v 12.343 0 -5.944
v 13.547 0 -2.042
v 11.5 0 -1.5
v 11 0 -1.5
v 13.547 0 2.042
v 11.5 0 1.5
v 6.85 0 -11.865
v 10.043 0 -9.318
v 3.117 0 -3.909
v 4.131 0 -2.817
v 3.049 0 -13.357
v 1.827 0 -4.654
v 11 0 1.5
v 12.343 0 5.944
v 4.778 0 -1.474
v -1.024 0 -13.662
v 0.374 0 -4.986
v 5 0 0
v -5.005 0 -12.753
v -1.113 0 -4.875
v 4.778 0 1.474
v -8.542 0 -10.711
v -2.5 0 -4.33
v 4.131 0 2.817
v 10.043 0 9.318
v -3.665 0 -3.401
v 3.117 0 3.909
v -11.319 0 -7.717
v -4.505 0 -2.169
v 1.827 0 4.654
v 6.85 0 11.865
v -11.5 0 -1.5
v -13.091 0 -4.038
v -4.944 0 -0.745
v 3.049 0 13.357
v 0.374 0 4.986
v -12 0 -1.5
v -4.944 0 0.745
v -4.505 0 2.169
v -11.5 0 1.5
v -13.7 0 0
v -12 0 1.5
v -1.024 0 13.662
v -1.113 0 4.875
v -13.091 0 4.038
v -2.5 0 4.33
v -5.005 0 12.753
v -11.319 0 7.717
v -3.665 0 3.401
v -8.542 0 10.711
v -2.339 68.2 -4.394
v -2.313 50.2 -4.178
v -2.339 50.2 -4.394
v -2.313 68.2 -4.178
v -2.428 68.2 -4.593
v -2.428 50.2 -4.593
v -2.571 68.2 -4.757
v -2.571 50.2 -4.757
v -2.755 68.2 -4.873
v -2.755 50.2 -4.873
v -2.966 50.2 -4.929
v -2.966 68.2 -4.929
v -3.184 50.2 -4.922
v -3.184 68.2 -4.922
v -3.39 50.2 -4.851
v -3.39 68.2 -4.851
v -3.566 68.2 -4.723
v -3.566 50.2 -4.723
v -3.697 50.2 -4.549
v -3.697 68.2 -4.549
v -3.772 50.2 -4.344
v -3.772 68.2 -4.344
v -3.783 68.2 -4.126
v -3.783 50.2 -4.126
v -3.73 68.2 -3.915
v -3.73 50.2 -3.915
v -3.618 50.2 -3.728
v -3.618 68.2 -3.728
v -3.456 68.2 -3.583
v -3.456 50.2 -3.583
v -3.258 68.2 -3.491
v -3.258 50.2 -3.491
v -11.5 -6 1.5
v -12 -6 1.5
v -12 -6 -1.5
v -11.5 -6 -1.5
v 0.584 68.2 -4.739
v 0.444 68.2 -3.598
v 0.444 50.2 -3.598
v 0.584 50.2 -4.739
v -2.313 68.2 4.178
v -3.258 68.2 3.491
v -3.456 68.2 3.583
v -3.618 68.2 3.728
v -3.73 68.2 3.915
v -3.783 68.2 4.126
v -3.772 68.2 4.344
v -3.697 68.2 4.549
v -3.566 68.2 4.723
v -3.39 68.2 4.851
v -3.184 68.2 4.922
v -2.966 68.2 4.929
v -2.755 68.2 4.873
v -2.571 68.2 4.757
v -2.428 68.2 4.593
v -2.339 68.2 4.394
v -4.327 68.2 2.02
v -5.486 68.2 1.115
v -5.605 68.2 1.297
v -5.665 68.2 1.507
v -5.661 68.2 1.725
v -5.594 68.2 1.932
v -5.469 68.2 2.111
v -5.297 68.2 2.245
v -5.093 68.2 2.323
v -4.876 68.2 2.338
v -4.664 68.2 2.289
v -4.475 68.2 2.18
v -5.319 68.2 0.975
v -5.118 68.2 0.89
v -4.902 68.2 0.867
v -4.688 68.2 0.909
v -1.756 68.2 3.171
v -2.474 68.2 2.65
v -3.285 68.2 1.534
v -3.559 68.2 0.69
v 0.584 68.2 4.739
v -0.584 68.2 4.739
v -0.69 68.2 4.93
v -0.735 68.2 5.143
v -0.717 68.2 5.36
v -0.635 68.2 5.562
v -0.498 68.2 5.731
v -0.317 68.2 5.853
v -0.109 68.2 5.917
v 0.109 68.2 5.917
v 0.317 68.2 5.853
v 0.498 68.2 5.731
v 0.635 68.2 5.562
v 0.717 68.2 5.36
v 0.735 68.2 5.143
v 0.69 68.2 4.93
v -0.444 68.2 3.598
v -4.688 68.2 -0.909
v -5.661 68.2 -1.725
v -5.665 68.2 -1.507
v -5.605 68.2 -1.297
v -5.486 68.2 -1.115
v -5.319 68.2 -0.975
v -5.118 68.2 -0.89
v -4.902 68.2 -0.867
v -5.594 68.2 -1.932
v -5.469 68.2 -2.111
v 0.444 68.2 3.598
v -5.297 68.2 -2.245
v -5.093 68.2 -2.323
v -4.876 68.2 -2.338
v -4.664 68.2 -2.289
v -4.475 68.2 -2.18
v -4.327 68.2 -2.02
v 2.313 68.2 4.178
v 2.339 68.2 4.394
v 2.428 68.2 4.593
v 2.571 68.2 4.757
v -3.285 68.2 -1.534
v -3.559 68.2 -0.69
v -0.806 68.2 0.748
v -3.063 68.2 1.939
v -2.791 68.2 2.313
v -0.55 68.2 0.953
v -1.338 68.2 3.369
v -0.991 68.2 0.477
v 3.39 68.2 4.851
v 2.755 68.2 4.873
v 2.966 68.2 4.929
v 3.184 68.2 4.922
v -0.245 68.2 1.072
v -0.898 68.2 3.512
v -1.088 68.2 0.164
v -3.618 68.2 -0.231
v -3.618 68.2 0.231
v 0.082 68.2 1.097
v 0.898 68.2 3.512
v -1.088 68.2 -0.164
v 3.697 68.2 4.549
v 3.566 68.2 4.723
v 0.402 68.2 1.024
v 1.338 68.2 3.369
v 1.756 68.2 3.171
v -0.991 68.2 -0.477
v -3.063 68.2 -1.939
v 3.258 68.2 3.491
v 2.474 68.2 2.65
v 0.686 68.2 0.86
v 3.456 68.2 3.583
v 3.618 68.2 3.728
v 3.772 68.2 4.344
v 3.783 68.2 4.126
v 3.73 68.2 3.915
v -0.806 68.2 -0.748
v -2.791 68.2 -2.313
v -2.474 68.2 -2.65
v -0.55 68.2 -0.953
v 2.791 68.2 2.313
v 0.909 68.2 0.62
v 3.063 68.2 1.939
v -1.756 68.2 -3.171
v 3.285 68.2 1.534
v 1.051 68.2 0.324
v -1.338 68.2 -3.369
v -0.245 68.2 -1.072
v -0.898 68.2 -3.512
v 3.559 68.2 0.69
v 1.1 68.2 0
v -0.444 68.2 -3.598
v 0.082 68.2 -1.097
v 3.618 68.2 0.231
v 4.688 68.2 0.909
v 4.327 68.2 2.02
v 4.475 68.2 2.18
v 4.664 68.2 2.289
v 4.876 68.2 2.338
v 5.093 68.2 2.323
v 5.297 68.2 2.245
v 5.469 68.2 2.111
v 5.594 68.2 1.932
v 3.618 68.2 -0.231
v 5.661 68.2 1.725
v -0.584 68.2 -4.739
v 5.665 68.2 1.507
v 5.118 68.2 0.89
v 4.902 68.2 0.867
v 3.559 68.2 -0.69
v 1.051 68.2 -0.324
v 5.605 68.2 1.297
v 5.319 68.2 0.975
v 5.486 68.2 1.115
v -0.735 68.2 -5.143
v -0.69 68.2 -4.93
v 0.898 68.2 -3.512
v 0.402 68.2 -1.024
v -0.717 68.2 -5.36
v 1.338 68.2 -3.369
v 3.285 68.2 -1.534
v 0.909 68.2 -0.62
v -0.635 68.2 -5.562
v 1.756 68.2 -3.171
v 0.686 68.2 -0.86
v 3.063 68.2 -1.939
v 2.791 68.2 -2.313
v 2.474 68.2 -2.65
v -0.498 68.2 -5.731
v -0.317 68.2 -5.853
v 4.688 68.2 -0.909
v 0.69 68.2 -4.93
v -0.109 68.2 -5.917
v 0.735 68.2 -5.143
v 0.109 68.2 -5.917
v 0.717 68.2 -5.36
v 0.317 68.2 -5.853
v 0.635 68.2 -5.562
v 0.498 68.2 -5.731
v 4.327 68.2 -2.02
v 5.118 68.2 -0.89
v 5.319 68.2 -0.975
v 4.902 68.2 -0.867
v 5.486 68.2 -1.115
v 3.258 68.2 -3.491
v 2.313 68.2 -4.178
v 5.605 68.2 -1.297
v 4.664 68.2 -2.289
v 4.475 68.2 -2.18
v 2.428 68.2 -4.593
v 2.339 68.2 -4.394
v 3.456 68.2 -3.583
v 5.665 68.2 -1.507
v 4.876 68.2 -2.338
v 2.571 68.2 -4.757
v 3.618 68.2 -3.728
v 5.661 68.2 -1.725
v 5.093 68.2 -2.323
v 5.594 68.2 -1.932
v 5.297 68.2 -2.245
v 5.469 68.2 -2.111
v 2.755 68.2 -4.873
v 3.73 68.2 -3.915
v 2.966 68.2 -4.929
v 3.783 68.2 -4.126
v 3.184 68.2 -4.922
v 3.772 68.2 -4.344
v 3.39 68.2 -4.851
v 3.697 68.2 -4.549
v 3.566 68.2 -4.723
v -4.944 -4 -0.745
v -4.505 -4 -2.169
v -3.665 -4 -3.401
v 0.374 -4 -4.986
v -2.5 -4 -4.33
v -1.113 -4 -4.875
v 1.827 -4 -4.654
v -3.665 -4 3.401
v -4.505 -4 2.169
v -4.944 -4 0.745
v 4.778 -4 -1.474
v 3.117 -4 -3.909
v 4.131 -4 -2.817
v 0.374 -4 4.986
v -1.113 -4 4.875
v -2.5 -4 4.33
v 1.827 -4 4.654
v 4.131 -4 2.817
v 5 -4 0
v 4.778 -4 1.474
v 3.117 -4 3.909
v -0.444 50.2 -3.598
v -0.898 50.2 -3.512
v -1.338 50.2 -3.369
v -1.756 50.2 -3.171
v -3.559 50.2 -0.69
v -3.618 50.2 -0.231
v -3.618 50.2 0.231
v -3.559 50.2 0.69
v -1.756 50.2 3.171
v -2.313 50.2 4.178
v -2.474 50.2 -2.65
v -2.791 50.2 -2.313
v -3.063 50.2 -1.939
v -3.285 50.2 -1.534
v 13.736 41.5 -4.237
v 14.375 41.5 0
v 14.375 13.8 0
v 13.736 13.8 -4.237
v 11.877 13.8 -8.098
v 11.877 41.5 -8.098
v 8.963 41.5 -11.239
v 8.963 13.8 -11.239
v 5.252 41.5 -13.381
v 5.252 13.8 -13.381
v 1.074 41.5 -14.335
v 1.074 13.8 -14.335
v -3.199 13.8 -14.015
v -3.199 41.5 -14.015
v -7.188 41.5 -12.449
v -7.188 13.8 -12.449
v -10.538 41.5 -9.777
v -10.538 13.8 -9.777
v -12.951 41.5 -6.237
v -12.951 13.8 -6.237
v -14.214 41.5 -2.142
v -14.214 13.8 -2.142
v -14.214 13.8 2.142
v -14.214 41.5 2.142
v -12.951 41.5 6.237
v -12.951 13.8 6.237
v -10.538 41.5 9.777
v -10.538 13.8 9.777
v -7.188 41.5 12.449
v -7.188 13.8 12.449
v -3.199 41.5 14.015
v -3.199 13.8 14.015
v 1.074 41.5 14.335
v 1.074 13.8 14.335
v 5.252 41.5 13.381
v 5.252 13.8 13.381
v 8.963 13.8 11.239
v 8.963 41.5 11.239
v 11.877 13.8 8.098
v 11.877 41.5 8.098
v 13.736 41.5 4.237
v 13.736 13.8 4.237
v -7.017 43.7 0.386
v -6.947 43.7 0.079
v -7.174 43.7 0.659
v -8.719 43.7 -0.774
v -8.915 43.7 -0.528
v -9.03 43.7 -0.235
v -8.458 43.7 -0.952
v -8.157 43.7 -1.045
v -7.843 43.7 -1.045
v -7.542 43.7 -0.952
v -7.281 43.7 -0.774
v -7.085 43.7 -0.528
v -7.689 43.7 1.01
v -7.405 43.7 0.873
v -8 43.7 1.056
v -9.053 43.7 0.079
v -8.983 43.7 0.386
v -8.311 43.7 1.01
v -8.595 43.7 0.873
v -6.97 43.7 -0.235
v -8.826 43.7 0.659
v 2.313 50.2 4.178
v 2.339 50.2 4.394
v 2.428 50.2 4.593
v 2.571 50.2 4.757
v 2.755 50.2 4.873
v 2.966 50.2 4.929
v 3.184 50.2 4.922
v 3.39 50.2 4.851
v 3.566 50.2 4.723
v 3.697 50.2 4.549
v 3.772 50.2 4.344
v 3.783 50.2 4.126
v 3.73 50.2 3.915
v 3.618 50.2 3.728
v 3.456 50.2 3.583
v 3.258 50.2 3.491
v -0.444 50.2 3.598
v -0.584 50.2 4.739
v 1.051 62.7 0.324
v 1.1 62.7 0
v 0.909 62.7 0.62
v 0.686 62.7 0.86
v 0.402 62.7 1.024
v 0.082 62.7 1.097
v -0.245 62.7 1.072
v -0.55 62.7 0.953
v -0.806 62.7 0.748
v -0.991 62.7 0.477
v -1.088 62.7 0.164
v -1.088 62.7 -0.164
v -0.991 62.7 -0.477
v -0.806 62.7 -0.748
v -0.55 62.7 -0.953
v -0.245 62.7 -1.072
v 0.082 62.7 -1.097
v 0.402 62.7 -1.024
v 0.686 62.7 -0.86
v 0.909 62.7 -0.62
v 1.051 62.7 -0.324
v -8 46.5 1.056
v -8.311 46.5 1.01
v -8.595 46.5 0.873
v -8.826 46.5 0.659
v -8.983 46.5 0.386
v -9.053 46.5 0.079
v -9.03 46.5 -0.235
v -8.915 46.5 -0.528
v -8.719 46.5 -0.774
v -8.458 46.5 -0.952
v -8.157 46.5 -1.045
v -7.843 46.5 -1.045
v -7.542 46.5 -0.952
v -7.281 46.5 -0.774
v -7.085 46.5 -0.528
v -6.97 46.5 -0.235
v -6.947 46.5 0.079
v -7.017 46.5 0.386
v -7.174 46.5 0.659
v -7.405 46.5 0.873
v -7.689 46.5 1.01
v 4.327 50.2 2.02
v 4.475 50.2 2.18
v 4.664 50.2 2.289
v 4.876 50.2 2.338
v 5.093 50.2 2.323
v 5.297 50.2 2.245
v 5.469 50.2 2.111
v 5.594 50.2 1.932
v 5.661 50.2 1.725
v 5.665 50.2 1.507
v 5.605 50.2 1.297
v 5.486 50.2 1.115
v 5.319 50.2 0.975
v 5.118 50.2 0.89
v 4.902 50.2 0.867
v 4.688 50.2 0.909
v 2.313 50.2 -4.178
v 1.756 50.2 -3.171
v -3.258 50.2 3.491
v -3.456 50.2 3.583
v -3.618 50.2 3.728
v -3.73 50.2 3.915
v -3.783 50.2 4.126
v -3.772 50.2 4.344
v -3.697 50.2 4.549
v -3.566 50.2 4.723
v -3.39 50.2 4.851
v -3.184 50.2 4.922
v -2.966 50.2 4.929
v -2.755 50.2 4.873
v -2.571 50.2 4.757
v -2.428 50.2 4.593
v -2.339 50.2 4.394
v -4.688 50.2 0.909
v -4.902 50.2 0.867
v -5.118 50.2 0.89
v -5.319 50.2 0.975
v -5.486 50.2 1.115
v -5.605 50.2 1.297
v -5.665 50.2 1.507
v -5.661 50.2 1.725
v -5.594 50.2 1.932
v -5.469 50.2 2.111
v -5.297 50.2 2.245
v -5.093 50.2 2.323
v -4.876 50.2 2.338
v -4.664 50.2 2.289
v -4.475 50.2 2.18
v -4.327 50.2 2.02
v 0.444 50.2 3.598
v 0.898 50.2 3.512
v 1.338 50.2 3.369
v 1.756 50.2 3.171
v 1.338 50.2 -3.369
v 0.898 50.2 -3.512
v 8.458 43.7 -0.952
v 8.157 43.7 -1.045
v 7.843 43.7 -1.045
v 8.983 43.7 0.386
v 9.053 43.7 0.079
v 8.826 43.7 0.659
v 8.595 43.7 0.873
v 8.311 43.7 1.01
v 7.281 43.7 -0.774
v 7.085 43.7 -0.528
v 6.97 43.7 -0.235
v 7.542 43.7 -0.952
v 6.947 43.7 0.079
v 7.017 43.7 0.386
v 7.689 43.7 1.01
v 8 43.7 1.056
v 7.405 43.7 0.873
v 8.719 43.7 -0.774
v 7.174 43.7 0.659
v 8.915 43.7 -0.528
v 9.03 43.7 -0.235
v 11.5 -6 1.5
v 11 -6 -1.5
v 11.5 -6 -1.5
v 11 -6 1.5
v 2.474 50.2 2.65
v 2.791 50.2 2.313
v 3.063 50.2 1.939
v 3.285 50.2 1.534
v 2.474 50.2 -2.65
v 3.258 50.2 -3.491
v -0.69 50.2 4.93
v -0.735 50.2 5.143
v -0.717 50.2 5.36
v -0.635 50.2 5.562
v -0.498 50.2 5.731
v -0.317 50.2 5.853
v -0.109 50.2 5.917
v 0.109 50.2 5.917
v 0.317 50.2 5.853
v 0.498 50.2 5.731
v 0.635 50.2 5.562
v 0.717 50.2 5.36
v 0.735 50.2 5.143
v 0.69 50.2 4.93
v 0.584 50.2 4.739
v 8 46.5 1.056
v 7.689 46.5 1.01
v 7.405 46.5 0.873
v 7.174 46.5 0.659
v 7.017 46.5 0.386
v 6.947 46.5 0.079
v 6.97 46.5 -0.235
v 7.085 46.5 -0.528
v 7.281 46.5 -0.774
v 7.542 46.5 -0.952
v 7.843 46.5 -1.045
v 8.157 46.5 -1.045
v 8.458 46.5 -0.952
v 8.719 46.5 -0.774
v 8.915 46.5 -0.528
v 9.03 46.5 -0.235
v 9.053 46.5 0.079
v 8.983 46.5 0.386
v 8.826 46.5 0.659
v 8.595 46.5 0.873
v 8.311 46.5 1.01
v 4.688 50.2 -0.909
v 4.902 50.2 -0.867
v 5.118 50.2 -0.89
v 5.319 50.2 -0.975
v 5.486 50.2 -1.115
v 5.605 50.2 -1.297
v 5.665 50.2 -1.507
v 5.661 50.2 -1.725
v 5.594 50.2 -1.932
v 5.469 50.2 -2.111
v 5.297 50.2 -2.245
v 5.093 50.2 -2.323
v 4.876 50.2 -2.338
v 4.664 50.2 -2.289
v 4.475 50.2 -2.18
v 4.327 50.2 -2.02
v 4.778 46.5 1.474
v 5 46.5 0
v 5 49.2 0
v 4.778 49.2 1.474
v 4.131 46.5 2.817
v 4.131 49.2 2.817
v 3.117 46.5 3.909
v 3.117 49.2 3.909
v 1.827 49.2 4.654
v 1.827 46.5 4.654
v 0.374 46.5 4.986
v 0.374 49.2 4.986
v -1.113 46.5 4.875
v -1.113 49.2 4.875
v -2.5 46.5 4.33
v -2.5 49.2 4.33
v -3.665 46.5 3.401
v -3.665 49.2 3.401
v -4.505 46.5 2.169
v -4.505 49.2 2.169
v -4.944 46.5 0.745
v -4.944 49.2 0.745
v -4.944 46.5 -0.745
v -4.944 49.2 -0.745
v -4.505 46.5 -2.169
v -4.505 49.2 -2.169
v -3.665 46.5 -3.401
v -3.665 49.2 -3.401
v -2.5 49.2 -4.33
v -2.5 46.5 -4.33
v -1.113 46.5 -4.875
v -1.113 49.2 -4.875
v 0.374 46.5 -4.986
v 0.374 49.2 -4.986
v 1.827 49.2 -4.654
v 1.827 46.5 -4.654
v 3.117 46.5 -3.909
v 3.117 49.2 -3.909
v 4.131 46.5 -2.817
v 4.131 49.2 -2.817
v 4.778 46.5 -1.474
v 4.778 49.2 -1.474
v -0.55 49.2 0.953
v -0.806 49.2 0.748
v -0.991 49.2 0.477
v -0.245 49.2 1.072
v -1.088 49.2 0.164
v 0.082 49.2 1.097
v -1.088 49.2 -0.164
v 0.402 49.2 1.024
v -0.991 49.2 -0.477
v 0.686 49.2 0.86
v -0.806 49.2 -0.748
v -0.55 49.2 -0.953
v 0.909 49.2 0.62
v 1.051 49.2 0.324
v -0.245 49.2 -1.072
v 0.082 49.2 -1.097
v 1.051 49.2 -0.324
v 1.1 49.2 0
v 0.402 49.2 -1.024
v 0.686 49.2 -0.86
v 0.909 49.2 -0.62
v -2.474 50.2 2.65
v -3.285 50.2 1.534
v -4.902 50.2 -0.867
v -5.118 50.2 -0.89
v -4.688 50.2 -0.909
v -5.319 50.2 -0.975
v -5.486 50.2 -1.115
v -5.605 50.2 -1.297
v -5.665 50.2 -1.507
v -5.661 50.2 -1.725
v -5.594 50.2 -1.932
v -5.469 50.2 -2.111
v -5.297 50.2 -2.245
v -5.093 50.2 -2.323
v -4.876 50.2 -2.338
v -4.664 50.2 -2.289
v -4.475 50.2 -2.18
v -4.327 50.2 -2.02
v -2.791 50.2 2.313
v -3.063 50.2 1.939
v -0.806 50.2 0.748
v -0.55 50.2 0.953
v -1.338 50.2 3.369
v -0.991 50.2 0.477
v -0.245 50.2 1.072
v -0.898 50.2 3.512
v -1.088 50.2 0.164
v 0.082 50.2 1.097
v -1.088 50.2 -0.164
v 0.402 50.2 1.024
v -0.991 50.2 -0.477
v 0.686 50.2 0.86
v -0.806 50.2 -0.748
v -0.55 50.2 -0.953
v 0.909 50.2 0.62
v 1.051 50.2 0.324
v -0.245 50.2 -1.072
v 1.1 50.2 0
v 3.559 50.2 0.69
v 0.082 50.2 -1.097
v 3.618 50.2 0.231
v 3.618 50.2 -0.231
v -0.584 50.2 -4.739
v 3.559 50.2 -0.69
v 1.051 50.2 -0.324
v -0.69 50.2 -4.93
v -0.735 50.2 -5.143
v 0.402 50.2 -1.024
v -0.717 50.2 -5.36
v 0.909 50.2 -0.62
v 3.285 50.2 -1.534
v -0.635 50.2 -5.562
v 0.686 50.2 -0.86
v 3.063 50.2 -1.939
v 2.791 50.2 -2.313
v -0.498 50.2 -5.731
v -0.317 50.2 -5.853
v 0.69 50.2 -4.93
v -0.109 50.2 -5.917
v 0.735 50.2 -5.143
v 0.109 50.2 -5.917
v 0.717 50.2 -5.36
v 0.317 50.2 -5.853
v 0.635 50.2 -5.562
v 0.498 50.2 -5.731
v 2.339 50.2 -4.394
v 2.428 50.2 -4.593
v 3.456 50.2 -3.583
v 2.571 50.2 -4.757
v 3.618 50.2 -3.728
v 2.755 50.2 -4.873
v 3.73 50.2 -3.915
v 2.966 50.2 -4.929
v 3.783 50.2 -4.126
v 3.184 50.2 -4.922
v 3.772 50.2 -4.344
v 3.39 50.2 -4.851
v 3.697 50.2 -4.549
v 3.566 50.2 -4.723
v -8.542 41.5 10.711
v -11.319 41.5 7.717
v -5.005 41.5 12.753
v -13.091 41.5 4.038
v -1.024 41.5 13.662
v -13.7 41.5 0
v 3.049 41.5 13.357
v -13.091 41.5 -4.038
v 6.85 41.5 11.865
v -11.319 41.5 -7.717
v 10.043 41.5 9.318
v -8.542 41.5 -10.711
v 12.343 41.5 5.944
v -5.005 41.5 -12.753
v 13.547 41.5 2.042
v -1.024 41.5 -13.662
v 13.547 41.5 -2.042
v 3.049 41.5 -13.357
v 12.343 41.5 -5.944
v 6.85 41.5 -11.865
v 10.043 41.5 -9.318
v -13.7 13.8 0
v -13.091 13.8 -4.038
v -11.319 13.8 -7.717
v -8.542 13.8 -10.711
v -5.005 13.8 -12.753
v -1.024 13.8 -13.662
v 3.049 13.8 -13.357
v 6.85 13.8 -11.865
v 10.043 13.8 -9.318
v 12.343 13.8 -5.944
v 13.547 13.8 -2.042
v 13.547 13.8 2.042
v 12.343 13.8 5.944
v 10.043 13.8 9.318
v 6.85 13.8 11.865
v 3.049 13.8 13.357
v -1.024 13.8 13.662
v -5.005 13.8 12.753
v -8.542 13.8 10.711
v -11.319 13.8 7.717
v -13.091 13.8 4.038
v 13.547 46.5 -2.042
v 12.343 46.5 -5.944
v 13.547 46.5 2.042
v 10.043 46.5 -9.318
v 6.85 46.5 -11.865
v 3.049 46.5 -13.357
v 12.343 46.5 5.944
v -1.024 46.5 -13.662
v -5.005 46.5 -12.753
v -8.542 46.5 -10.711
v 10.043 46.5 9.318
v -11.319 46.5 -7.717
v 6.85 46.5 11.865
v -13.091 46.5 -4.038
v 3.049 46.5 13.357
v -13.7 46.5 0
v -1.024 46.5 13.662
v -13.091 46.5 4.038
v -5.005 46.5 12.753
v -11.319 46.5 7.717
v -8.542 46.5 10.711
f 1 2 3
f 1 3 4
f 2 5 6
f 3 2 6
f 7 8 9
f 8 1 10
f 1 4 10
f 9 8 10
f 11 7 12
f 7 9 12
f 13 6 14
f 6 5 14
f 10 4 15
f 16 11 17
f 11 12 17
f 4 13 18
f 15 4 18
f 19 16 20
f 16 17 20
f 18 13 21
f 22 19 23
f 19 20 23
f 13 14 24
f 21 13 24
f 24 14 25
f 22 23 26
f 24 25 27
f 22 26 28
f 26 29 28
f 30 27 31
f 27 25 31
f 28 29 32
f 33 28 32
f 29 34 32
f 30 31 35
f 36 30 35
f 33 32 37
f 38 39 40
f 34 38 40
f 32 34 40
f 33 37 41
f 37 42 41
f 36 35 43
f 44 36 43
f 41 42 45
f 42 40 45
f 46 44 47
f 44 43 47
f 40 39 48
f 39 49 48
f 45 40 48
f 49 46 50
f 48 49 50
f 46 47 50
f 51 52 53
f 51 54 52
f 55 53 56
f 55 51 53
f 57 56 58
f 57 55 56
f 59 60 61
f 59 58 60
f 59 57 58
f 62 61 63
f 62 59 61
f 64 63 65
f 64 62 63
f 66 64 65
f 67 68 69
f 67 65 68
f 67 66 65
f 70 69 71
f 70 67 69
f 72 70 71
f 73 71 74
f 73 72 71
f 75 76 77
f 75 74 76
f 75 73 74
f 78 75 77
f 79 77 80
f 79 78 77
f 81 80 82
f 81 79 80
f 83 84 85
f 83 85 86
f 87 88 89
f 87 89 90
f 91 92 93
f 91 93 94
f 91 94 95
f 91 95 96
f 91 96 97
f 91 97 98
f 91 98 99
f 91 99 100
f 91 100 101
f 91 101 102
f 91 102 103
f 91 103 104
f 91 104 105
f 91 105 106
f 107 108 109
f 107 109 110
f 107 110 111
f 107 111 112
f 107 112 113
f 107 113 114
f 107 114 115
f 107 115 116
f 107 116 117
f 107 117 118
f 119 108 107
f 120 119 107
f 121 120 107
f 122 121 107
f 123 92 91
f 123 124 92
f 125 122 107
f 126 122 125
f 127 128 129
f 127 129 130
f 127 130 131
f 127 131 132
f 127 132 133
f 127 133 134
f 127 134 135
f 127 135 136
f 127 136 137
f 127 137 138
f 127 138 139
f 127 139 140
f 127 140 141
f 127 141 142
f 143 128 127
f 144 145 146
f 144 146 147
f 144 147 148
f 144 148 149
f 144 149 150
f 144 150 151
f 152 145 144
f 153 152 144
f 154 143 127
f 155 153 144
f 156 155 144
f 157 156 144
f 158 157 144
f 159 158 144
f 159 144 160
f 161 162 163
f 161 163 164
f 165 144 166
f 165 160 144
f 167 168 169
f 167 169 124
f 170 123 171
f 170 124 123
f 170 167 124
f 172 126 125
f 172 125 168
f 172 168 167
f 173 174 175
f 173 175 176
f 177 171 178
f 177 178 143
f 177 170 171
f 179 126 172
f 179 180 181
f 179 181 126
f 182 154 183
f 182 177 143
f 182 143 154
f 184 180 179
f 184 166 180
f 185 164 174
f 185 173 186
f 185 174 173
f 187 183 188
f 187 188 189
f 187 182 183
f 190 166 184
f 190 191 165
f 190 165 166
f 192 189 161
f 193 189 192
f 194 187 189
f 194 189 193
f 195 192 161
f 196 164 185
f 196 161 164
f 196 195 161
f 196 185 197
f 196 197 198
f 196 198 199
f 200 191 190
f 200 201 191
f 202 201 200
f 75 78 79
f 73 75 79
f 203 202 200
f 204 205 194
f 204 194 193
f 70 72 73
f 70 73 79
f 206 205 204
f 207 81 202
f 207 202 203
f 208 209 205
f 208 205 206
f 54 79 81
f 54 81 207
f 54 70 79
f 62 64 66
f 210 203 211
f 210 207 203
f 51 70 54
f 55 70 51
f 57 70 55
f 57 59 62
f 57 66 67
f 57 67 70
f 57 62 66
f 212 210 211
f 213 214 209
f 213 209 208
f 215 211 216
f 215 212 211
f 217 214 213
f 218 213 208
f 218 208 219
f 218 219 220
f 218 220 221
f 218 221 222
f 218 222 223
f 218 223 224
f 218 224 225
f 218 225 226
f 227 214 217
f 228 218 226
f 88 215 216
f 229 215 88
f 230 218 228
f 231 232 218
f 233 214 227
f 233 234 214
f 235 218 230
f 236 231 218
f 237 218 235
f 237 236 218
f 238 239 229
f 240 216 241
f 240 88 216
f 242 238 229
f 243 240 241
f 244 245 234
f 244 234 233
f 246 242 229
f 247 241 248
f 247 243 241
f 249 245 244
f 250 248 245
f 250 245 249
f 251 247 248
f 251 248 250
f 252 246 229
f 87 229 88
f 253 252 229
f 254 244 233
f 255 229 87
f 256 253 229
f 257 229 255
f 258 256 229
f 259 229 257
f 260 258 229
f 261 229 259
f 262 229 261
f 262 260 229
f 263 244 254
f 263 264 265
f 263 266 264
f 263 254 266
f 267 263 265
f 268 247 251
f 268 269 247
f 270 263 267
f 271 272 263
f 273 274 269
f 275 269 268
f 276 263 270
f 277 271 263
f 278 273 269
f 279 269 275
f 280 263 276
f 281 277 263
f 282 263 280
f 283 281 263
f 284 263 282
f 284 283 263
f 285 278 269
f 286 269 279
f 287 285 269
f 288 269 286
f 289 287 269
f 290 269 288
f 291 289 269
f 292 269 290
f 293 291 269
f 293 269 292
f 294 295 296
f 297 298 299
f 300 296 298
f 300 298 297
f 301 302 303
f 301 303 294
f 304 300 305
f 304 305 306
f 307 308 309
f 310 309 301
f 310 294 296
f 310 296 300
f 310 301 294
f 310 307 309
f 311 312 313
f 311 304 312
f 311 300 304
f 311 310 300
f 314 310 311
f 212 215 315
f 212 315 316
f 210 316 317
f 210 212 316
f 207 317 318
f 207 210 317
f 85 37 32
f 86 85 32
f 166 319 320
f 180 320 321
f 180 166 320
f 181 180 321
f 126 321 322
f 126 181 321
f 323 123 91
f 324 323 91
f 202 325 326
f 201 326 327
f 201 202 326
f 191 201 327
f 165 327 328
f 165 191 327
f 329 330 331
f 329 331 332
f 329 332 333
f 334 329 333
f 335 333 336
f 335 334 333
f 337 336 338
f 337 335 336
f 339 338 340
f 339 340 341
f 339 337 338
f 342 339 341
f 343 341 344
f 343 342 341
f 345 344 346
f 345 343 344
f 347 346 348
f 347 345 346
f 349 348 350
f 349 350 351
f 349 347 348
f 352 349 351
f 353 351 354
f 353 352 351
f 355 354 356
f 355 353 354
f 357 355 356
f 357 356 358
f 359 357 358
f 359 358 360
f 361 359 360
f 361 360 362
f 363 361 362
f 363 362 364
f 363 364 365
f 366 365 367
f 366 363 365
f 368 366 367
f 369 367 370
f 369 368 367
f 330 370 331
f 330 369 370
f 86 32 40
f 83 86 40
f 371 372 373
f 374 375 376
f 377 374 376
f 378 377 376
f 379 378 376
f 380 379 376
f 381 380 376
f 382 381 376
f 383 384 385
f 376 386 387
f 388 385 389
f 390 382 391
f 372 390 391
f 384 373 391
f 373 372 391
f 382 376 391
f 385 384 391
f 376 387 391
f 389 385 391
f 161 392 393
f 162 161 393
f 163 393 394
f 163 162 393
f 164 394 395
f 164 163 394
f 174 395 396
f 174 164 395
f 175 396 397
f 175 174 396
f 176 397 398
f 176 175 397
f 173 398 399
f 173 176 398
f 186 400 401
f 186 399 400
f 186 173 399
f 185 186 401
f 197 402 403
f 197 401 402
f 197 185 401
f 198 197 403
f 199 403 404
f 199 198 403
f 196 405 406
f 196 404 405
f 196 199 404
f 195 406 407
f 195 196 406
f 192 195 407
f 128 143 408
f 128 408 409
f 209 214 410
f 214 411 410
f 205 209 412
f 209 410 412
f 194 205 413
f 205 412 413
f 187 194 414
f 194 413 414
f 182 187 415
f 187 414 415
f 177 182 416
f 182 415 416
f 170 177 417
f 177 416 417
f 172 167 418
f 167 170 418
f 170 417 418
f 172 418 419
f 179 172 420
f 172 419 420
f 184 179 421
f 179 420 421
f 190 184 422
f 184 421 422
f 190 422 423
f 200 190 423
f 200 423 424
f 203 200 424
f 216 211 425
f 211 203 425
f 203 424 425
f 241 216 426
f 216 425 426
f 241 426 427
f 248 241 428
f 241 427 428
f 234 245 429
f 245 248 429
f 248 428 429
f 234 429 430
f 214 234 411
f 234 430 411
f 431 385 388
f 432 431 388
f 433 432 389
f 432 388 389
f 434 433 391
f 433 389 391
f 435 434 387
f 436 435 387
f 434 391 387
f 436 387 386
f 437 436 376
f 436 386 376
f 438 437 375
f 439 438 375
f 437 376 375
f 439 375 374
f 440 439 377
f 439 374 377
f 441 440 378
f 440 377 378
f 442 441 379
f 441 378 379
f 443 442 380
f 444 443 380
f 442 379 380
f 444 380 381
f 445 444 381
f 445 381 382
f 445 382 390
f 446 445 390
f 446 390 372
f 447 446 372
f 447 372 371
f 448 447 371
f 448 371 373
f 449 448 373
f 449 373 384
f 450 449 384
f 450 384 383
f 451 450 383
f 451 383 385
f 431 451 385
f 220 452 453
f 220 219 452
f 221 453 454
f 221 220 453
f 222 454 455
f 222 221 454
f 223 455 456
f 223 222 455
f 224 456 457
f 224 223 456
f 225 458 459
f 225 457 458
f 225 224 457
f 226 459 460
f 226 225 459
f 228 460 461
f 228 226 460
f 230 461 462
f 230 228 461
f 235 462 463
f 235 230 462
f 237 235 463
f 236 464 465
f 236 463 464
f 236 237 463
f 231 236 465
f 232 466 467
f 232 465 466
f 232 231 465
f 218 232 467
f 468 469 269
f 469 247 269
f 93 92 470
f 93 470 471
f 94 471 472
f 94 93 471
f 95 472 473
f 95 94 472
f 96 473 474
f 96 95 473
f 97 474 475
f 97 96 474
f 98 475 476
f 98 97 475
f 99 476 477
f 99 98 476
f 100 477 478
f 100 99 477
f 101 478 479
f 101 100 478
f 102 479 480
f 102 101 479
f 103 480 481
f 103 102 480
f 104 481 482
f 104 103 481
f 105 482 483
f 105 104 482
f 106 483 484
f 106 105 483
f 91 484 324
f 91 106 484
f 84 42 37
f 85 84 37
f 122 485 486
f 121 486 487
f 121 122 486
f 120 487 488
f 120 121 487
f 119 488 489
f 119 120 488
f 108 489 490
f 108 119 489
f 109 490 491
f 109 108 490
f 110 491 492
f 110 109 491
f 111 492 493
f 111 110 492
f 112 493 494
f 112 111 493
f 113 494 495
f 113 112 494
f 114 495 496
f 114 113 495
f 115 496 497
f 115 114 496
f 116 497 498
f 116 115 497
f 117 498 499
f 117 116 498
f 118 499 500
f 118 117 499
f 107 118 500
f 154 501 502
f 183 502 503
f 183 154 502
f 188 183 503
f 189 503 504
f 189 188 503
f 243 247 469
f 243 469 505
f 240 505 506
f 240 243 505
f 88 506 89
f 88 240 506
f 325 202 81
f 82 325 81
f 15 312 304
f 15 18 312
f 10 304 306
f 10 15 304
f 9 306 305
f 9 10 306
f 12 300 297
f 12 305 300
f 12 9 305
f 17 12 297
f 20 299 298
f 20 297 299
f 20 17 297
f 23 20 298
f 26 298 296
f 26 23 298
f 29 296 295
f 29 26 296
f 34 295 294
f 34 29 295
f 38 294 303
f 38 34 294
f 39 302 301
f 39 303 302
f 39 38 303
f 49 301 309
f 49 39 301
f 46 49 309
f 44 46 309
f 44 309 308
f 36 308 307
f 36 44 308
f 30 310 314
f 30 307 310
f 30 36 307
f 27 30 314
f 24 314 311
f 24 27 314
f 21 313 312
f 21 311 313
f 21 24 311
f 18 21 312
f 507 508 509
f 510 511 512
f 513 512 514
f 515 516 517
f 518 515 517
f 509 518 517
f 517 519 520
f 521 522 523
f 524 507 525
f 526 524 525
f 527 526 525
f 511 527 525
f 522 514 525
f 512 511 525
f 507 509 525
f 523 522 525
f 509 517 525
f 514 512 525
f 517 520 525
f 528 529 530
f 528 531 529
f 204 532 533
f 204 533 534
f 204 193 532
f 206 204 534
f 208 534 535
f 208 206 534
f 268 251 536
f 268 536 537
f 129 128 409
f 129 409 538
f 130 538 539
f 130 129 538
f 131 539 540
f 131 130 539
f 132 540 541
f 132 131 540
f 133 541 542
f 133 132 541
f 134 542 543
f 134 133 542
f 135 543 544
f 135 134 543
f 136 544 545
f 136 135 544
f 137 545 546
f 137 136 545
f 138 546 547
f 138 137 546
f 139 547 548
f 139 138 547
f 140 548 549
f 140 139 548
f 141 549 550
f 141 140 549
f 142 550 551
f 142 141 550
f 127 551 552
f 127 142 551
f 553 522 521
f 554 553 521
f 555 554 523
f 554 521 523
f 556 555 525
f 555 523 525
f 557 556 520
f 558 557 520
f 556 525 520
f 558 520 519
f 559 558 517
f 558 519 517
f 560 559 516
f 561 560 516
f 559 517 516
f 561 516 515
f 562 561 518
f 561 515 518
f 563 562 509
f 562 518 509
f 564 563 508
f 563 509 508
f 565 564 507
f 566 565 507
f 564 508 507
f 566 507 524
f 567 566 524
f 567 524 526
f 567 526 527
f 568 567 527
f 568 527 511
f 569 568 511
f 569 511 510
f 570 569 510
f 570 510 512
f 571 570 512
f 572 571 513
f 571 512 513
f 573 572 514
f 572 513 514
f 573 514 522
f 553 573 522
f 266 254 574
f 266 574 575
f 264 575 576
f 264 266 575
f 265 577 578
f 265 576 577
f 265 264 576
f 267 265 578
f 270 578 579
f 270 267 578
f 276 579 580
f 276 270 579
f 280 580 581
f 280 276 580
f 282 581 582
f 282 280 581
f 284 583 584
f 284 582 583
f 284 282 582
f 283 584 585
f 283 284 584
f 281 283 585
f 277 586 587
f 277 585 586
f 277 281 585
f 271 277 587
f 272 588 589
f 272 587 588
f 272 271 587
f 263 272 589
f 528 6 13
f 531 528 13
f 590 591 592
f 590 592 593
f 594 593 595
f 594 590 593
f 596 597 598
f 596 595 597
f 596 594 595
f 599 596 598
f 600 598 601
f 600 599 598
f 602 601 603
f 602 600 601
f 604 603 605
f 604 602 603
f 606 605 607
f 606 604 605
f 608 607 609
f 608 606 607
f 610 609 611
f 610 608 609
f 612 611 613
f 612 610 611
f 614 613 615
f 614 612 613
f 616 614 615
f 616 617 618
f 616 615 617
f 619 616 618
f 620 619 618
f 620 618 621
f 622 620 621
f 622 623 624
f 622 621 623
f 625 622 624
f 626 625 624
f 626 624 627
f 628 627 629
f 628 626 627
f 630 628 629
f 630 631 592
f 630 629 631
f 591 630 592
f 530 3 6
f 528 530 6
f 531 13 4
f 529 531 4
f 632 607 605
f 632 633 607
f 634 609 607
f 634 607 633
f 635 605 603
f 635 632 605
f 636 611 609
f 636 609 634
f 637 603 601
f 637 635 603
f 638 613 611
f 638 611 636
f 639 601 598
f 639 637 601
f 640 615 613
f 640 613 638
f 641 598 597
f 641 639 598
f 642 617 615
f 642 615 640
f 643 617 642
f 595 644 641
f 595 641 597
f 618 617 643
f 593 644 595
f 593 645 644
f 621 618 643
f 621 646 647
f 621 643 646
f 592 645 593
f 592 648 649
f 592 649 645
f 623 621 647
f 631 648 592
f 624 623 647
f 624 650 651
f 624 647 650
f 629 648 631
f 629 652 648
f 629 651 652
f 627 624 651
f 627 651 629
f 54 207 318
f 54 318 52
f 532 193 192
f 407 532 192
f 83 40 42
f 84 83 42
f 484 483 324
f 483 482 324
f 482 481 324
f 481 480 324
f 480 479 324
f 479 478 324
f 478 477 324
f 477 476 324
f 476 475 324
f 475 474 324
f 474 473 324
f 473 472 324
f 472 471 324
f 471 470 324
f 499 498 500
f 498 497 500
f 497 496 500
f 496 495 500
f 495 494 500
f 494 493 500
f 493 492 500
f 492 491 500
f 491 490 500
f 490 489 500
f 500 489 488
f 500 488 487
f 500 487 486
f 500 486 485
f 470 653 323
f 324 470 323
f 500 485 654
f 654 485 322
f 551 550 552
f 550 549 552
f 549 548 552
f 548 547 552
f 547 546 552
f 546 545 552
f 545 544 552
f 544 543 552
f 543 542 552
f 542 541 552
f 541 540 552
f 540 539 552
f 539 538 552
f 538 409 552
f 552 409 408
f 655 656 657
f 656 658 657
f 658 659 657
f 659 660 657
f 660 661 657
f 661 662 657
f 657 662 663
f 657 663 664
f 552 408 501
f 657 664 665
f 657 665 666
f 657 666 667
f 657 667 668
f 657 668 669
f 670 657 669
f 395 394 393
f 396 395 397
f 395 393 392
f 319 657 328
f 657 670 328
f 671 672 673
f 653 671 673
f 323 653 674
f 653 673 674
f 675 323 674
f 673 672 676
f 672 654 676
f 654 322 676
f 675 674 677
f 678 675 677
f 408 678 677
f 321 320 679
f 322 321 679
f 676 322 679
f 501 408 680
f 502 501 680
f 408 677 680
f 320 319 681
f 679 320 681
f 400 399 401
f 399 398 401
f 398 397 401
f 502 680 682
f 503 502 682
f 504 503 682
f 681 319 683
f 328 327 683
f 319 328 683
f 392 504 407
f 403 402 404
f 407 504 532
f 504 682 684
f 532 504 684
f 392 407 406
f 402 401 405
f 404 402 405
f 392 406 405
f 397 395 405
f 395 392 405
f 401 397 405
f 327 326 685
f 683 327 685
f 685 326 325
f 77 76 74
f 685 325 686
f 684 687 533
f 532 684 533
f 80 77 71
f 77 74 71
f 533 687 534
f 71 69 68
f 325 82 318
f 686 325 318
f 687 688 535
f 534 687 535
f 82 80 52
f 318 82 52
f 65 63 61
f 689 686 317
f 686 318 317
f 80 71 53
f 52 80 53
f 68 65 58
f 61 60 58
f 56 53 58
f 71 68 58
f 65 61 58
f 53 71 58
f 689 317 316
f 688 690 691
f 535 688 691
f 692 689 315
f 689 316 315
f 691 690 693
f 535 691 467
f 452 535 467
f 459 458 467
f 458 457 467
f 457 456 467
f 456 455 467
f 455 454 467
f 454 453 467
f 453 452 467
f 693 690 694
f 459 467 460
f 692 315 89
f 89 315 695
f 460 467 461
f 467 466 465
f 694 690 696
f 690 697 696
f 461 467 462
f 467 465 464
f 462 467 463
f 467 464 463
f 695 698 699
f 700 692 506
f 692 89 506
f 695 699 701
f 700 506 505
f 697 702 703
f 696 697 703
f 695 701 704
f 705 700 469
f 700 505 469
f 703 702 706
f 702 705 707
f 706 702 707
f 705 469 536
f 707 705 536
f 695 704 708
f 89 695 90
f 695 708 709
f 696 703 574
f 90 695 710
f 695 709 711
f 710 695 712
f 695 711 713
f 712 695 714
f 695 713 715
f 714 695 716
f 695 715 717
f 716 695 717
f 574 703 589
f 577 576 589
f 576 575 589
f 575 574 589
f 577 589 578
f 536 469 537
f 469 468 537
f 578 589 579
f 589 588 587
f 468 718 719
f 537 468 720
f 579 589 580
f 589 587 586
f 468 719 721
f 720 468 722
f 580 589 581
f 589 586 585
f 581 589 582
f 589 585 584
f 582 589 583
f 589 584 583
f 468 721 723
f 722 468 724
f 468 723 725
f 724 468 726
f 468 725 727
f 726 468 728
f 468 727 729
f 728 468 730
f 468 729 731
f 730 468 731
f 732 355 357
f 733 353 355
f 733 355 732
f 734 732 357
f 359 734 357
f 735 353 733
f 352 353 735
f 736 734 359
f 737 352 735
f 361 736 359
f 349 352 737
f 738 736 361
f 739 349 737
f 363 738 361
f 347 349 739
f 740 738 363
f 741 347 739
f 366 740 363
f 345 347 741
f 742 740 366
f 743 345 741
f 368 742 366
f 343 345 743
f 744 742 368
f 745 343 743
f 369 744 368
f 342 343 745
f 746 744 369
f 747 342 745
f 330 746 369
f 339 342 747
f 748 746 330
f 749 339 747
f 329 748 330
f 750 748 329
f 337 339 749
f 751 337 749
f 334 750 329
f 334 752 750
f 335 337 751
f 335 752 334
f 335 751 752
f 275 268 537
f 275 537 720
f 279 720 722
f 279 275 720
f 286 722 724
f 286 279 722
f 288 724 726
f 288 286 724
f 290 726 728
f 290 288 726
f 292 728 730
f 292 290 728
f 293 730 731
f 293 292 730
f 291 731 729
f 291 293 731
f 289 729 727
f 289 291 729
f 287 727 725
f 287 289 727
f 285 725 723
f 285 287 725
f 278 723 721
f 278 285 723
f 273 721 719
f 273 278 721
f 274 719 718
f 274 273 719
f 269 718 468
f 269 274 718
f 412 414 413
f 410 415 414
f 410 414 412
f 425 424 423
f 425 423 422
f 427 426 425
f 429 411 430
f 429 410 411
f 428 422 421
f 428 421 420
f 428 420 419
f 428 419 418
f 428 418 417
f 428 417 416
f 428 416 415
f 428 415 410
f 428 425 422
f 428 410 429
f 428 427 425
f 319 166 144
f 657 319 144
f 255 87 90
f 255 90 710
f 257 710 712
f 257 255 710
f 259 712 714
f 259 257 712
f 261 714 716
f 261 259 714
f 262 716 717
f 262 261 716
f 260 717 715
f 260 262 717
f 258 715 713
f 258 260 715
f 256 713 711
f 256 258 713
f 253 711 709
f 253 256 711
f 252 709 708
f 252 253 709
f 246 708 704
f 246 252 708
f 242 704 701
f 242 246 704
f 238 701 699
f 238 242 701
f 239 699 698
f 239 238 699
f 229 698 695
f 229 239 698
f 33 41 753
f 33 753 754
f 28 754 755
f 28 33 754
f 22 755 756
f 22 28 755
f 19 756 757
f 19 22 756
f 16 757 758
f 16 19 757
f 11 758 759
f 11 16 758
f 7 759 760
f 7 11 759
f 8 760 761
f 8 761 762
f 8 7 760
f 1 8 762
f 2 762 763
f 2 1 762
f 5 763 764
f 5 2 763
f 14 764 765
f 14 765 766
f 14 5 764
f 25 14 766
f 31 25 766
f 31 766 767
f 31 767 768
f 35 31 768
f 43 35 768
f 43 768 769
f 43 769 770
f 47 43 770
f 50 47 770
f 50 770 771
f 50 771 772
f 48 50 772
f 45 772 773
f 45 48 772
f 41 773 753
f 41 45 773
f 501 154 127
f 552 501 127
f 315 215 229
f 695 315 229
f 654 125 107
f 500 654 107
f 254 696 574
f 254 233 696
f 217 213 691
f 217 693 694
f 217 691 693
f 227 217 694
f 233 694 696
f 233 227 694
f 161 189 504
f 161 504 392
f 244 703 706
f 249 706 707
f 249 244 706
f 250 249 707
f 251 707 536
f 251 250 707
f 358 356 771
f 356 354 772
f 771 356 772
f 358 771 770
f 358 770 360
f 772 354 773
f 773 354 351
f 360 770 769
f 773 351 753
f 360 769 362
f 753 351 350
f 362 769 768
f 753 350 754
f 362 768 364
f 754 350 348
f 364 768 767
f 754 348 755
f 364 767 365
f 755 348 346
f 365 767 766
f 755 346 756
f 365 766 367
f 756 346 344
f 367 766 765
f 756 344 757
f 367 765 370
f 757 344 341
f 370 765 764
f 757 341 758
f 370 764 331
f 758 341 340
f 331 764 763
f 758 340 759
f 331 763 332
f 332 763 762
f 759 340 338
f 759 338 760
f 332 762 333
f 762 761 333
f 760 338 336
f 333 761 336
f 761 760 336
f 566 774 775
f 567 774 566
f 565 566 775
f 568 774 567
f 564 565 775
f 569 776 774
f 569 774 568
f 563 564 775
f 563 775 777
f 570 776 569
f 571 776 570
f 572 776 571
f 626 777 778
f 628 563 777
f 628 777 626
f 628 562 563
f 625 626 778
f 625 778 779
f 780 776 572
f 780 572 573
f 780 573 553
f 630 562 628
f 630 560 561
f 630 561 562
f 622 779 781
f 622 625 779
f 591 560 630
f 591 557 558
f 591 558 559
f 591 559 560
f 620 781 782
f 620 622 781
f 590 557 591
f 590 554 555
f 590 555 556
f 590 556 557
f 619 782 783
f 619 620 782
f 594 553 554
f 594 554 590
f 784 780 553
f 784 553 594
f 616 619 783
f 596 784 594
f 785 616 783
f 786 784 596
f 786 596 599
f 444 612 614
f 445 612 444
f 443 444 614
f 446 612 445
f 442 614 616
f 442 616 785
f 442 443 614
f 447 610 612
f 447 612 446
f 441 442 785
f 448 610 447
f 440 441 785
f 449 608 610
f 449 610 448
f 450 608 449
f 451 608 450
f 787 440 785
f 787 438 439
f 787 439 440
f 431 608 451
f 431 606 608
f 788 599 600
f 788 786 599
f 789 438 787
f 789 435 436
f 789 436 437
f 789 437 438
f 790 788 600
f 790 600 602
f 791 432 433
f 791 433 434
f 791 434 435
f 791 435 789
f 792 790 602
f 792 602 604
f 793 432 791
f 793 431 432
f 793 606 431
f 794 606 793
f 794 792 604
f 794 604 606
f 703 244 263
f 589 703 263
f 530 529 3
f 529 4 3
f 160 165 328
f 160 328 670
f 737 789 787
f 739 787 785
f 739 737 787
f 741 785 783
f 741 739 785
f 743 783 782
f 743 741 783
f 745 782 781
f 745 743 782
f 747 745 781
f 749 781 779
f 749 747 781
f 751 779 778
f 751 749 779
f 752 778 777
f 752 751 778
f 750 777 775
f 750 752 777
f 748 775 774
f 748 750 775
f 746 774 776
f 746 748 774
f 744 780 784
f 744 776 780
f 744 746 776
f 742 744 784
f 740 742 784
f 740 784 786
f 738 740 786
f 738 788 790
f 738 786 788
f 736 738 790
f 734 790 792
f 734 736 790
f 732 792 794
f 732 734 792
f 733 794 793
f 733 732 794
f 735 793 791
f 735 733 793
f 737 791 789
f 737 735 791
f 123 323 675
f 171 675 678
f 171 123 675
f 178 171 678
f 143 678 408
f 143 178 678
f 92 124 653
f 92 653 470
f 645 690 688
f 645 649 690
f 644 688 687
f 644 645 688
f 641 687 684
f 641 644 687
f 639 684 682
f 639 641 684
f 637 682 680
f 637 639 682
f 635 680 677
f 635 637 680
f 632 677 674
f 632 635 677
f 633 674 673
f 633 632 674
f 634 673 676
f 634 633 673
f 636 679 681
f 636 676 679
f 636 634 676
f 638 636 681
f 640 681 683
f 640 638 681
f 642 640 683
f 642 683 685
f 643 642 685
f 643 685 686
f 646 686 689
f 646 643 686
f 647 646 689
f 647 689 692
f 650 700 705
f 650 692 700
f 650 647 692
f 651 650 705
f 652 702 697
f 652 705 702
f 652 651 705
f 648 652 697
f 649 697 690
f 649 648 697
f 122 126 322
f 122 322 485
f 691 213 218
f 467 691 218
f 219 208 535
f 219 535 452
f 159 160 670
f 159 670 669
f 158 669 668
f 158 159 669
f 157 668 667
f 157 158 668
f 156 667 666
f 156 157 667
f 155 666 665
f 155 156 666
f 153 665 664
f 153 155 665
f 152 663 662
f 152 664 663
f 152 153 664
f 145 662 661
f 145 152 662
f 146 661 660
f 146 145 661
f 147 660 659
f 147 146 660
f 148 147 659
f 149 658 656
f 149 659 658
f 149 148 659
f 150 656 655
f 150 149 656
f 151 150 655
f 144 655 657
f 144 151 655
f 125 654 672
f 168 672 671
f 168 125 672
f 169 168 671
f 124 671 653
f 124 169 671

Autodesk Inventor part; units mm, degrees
ref_plane "YZ Plane" through (0, 0, 0) normal (1, 0, 0) x (0, 1, 0)
ref_plane "XZ Plane" through (0, 0, 0) normal (0, 1, 0) x (-1, 0, 0)
ref_plane "XY Plane" through (0, 0, 0) normal (0, 0, 1) x (1, 0, 0)
sketch "Sketch1" plane through (0, 0, 0) normal (0, 1, 0) x (-1, 0, 0)
  circle A0 centre (0, 0) radius 13.7
  dimension "d0" = 27.4
extrude "Extrusion1" add sketch "Sketch1" along normal blind 46.5
sketch "Sketch2" plane through (0, 46.5, 0) normal (0, 1, 0) x (1, 0, 0)
  circle A0 centre (0, 0) radius 13.7 projected
  circle A1 centre (0, 0) radius 5
  dimension "d3" = 10
extrude "Extrusion2" add sketch "Sketch2" along normal blind 2.7 contours A1
sketch "Sketch3" plane through (0, 46.5, 0) normal (0, 1, 0) x (1, 0, 0)
  circle A0 centre (0, 0) radius 5 projected
  circle A1 centre (0, 0) radius 5 projected
  circle A2 centre (0, 0) radius 13.7 projected
  circle A3 centre (0, 0) radius 13.7 projected
  line L0 (-13.7, 0) -> (13.7, 0)
  point P0 (-8, 0)
  point P1 (8, 0)
  dimension "d6" = 16
  dimension "d7" = 5.7
  dimension "d8" = 5.7
hole "Hole1" at (-8, 46.5, 0) at (8, 46.5, 0) direction (0, -1, 0) diameter 2.1129 depth 2.8 thread size "M2.6x0.45" class "6H" standard "ISO Metric profile"
ref_plane "Work Plane1" through (0, 41.5, 0) normal (0, 1, 0) x (1, 0, 0)
sketch "Sketch4" plane through (0, 41.5, 0) normal (0, 1, 0) x (1, 0, 0)
  circle A0 centre (0, 0) radius 14.375
  dimension "d17" = 28.75
extrude "Extrusion3" add sketch "Sketch4" against normal blind 27.7
sketch "Sketch5" plane through (0, 0, 0) normal (0, -1, 0) x (1, 0, 0)
  circle A0 centre (0, 0) radius 5
  dimension "d20" = 10
extrude "Extrusion4" add sketch "Sketch5" along normal blind 4
sketch "Sketch6" plane through (0, 0, 0) normal (0, -1, 0) x (1, 0, 0)
  circle A0 centre (0, 0) radius 5 projected
  circle A1 centre (0, 0) radius 5 projected
  circle A2 centre (0, 0) radius 13.7 projected
  circle A3 centre (0, 0) radius 13.7 projected
  line L0 (13.7, 0) -> (-13.7, 0)
  line L1 (-11.5, 1.5) -> (-12, 1.5)
  line L2 (-12, 1.5) -> (-12, -1.5)
  line L3 (-12, -1.5) -> (-11.5, -1.5)
  line L4 (-11.5, -1.5) -> (-11.5, 1.5)
  line L5 (11.5, 1.5) -> (11, 1.5)
  line L6 (11, 1.5) -> (11, -1.5)
  line L7 (11, -1.5) -> (11.5, -1.5)
  line L8 (11.5, -1.5) -> (11.5, 1.5)
  dimension "d23" = 22.5
  dimension "d24" = 0.5
  dimension "d25" = 0.5
  dimension "d26" = 11.5
  dimension "d27" = 11.5
  dimension "d28" = 3
  dimension "d29" = 3
  dimension "d30" = 1.5
  dimension "d31" = 1.5
extrude "Extrusion5" add sketch "Sketch6" along normal blind 6 contours L6 L5 L8 L0 | L0 L8 L7 L6 | L4 L3 L2 L0 | L0 L2 L1 L4
sketch "Sketch7" plane through (0, 49.2, 0) normal (0, 1, 0) x (1, 0, 0)
  circle A0 centre (0, 0) radius 1.1
  dimension "d34" = 2.2
extrude "Extrusion6" add sketch "Sketch7" along normal blind 13.5
sketch "Sketch8" plane through (0, 62.7, 0) normal (0, 1, 0) x (1, 0, 0)
  circle A0 centre (0, 0) radius 1.1 projected
  circle A1 centre (0, 0) radius 5.925
  circle A2 centre (0, 0) radius 3.625
  circle A3 centre (0, 0) radius 4.775
  arc A4 (0.5843, 4.7391) -> (-0.5843, 4.7391) centre (0, 5.1881) ccw
  line L0 (0.4436, 3.5978) -> (0.725, 5.8805)
  line L1 (-0.4436, 3.5978) -> (-0.725, 5.8805)
  line L2 (-1.7559, 3.1714) -> (-2.8699, 5.1835)
  line L3 (-2.4736, 2.6499) -> (-4.043, 4.3313)
  arc A5 (-2.3129, 4.1775) -> (-3.2583, 3.4906) centre (-3.0495, 4.1973) ccw
  line L4 (-3.2846, 1.5336) -> (-5.3686, 2.5067)
  line L5 (-3.5587, 0.6899) -> (-5.8167, 1.1277)
  arc A6 (-4.3266, 2.0202) -> (-4.6877, 0.9088) centre (-4.9342, 1.6032) ccw
  line L6 (-3.5587, -0.6899) -> (-5.8167, -1.1277)
  line L7 (-3.2846, -1.5336) -> (-5.3686, -2.5067)
  arc A7 (-4.6877, -0.9088) -> (-4.3266, -2.0202) centre (-4.9342, -1.6032) ccw
  line L8 (-2.4736, -2.6499) -> (-4.043, -4.3313)
  line L9 (-1.7559, -3.1714) -> (-2.8699, -5.1835)
  arc A8 (-3.2583, -3.4906) -> (-2.3129, -4.1775) centre (-3.0495, -4.1973) ccw
  line L10 (-0.4436, -3.5978) -> (-0.725, -5.8805)
  line L11 (0.4436, -3.5978) -> (0.725, -5.8805)
  arc A9 (-0.5843, -4.7391) -> (0.5843, -4.7391) centre (0, -5.1881) ccw
  line L12 (1.7559, -3.1714) -> (2.8699, -5.1835)
  line L13 (2.4736, -2.6499) -> (4.043, -4.3313)
  arc A10 (2.3129, -4.1775) -> (3.2583, -3.4906) centre (3.0495, -4.1973) ccw
  line L14 (3.2846, -1.5336) -> (5.3686, -2.5067)
  line L15 (3.5587, -0.6899) -> (5.8167, -1.1277)
  arc A11 (4.3266, -2.0202) -> (4.6877, -0.9088) centre (4.9342, -1.6032) ccw
  line L16 (3.5587, 0.6899) -> (5.8167, 1.1277)
  line L17 (3.2846, 1.5336) -> (5.3686, 2.5067)
  arc A12 (4.6877, 0.9088) -> (4.3266, 2.0202) centre (4.9342, 1.6032) ccw
  line L18 (2.4736, 2.6499) -> (4.043, 4.3313)
  line L19 (1.7559, 3.1714) -> (2.8699, 5.1835)
  arc A13 (3.2583, 3.4906) -> (2.3129, 4.1775) centre (3.0495, 4.1973) ccw
  point P0 (3.7689, -4.0376)
  dimension "d37" = 11.85
  dimension "d38" = 7.25
  dimension "d39" = 1.45
  dimension "d43" = 1.15
  dimension "d44" = 1.15
  dimension "d47" = 360
extrude "Extrusion7" add sketch "Sketch8" along normal blind 5.5 and the other way blind 12.5 contours A12 L16 A3 L17 | A12 L16 | A11 L14 A3 L15 | L15 A11 | L17 A12 | L16 A2 L17 A3 | A11 L14 | A3 L14 A2 L15 | A2 | A13 L18 A3 L19 | A13 L18 | L18 A2 L19 A3 | A10 L12 A3 L13 | L13 A10 | A3 L12 A2 L13 | L19 A13 | A10 L12 | L0 A2 L1 A3 | L0 A4 | A3 L1 A4 L0 | L11 A9 L10 A3 | A3 L10 A2 L11 | A9 L11 | A4 L1 | L10 A9 | L2 A2 L3 A3 | A3 L3 A5 L2 | L2 A5 | L9 A8 L8 A3 | A3 L8 A2 L9 | A8 L9 | A5 L3 | L8 A8 | L4 A2 L5 A3 | A3 L5 A6 L4 | L4 A6 | L7 A7 L6 A3 | A3 L6 A2 L7 | A7 L7 | A6 L5 | L6 A7
equation "\"d7\" = d8"
equation "\"d26\" = d27"
equation "\"d30\" = d31"
equation "\"d43\" = d44"
equation "\"d41\" = d42"
properties part number "rs390" material "Steel, Mild"
